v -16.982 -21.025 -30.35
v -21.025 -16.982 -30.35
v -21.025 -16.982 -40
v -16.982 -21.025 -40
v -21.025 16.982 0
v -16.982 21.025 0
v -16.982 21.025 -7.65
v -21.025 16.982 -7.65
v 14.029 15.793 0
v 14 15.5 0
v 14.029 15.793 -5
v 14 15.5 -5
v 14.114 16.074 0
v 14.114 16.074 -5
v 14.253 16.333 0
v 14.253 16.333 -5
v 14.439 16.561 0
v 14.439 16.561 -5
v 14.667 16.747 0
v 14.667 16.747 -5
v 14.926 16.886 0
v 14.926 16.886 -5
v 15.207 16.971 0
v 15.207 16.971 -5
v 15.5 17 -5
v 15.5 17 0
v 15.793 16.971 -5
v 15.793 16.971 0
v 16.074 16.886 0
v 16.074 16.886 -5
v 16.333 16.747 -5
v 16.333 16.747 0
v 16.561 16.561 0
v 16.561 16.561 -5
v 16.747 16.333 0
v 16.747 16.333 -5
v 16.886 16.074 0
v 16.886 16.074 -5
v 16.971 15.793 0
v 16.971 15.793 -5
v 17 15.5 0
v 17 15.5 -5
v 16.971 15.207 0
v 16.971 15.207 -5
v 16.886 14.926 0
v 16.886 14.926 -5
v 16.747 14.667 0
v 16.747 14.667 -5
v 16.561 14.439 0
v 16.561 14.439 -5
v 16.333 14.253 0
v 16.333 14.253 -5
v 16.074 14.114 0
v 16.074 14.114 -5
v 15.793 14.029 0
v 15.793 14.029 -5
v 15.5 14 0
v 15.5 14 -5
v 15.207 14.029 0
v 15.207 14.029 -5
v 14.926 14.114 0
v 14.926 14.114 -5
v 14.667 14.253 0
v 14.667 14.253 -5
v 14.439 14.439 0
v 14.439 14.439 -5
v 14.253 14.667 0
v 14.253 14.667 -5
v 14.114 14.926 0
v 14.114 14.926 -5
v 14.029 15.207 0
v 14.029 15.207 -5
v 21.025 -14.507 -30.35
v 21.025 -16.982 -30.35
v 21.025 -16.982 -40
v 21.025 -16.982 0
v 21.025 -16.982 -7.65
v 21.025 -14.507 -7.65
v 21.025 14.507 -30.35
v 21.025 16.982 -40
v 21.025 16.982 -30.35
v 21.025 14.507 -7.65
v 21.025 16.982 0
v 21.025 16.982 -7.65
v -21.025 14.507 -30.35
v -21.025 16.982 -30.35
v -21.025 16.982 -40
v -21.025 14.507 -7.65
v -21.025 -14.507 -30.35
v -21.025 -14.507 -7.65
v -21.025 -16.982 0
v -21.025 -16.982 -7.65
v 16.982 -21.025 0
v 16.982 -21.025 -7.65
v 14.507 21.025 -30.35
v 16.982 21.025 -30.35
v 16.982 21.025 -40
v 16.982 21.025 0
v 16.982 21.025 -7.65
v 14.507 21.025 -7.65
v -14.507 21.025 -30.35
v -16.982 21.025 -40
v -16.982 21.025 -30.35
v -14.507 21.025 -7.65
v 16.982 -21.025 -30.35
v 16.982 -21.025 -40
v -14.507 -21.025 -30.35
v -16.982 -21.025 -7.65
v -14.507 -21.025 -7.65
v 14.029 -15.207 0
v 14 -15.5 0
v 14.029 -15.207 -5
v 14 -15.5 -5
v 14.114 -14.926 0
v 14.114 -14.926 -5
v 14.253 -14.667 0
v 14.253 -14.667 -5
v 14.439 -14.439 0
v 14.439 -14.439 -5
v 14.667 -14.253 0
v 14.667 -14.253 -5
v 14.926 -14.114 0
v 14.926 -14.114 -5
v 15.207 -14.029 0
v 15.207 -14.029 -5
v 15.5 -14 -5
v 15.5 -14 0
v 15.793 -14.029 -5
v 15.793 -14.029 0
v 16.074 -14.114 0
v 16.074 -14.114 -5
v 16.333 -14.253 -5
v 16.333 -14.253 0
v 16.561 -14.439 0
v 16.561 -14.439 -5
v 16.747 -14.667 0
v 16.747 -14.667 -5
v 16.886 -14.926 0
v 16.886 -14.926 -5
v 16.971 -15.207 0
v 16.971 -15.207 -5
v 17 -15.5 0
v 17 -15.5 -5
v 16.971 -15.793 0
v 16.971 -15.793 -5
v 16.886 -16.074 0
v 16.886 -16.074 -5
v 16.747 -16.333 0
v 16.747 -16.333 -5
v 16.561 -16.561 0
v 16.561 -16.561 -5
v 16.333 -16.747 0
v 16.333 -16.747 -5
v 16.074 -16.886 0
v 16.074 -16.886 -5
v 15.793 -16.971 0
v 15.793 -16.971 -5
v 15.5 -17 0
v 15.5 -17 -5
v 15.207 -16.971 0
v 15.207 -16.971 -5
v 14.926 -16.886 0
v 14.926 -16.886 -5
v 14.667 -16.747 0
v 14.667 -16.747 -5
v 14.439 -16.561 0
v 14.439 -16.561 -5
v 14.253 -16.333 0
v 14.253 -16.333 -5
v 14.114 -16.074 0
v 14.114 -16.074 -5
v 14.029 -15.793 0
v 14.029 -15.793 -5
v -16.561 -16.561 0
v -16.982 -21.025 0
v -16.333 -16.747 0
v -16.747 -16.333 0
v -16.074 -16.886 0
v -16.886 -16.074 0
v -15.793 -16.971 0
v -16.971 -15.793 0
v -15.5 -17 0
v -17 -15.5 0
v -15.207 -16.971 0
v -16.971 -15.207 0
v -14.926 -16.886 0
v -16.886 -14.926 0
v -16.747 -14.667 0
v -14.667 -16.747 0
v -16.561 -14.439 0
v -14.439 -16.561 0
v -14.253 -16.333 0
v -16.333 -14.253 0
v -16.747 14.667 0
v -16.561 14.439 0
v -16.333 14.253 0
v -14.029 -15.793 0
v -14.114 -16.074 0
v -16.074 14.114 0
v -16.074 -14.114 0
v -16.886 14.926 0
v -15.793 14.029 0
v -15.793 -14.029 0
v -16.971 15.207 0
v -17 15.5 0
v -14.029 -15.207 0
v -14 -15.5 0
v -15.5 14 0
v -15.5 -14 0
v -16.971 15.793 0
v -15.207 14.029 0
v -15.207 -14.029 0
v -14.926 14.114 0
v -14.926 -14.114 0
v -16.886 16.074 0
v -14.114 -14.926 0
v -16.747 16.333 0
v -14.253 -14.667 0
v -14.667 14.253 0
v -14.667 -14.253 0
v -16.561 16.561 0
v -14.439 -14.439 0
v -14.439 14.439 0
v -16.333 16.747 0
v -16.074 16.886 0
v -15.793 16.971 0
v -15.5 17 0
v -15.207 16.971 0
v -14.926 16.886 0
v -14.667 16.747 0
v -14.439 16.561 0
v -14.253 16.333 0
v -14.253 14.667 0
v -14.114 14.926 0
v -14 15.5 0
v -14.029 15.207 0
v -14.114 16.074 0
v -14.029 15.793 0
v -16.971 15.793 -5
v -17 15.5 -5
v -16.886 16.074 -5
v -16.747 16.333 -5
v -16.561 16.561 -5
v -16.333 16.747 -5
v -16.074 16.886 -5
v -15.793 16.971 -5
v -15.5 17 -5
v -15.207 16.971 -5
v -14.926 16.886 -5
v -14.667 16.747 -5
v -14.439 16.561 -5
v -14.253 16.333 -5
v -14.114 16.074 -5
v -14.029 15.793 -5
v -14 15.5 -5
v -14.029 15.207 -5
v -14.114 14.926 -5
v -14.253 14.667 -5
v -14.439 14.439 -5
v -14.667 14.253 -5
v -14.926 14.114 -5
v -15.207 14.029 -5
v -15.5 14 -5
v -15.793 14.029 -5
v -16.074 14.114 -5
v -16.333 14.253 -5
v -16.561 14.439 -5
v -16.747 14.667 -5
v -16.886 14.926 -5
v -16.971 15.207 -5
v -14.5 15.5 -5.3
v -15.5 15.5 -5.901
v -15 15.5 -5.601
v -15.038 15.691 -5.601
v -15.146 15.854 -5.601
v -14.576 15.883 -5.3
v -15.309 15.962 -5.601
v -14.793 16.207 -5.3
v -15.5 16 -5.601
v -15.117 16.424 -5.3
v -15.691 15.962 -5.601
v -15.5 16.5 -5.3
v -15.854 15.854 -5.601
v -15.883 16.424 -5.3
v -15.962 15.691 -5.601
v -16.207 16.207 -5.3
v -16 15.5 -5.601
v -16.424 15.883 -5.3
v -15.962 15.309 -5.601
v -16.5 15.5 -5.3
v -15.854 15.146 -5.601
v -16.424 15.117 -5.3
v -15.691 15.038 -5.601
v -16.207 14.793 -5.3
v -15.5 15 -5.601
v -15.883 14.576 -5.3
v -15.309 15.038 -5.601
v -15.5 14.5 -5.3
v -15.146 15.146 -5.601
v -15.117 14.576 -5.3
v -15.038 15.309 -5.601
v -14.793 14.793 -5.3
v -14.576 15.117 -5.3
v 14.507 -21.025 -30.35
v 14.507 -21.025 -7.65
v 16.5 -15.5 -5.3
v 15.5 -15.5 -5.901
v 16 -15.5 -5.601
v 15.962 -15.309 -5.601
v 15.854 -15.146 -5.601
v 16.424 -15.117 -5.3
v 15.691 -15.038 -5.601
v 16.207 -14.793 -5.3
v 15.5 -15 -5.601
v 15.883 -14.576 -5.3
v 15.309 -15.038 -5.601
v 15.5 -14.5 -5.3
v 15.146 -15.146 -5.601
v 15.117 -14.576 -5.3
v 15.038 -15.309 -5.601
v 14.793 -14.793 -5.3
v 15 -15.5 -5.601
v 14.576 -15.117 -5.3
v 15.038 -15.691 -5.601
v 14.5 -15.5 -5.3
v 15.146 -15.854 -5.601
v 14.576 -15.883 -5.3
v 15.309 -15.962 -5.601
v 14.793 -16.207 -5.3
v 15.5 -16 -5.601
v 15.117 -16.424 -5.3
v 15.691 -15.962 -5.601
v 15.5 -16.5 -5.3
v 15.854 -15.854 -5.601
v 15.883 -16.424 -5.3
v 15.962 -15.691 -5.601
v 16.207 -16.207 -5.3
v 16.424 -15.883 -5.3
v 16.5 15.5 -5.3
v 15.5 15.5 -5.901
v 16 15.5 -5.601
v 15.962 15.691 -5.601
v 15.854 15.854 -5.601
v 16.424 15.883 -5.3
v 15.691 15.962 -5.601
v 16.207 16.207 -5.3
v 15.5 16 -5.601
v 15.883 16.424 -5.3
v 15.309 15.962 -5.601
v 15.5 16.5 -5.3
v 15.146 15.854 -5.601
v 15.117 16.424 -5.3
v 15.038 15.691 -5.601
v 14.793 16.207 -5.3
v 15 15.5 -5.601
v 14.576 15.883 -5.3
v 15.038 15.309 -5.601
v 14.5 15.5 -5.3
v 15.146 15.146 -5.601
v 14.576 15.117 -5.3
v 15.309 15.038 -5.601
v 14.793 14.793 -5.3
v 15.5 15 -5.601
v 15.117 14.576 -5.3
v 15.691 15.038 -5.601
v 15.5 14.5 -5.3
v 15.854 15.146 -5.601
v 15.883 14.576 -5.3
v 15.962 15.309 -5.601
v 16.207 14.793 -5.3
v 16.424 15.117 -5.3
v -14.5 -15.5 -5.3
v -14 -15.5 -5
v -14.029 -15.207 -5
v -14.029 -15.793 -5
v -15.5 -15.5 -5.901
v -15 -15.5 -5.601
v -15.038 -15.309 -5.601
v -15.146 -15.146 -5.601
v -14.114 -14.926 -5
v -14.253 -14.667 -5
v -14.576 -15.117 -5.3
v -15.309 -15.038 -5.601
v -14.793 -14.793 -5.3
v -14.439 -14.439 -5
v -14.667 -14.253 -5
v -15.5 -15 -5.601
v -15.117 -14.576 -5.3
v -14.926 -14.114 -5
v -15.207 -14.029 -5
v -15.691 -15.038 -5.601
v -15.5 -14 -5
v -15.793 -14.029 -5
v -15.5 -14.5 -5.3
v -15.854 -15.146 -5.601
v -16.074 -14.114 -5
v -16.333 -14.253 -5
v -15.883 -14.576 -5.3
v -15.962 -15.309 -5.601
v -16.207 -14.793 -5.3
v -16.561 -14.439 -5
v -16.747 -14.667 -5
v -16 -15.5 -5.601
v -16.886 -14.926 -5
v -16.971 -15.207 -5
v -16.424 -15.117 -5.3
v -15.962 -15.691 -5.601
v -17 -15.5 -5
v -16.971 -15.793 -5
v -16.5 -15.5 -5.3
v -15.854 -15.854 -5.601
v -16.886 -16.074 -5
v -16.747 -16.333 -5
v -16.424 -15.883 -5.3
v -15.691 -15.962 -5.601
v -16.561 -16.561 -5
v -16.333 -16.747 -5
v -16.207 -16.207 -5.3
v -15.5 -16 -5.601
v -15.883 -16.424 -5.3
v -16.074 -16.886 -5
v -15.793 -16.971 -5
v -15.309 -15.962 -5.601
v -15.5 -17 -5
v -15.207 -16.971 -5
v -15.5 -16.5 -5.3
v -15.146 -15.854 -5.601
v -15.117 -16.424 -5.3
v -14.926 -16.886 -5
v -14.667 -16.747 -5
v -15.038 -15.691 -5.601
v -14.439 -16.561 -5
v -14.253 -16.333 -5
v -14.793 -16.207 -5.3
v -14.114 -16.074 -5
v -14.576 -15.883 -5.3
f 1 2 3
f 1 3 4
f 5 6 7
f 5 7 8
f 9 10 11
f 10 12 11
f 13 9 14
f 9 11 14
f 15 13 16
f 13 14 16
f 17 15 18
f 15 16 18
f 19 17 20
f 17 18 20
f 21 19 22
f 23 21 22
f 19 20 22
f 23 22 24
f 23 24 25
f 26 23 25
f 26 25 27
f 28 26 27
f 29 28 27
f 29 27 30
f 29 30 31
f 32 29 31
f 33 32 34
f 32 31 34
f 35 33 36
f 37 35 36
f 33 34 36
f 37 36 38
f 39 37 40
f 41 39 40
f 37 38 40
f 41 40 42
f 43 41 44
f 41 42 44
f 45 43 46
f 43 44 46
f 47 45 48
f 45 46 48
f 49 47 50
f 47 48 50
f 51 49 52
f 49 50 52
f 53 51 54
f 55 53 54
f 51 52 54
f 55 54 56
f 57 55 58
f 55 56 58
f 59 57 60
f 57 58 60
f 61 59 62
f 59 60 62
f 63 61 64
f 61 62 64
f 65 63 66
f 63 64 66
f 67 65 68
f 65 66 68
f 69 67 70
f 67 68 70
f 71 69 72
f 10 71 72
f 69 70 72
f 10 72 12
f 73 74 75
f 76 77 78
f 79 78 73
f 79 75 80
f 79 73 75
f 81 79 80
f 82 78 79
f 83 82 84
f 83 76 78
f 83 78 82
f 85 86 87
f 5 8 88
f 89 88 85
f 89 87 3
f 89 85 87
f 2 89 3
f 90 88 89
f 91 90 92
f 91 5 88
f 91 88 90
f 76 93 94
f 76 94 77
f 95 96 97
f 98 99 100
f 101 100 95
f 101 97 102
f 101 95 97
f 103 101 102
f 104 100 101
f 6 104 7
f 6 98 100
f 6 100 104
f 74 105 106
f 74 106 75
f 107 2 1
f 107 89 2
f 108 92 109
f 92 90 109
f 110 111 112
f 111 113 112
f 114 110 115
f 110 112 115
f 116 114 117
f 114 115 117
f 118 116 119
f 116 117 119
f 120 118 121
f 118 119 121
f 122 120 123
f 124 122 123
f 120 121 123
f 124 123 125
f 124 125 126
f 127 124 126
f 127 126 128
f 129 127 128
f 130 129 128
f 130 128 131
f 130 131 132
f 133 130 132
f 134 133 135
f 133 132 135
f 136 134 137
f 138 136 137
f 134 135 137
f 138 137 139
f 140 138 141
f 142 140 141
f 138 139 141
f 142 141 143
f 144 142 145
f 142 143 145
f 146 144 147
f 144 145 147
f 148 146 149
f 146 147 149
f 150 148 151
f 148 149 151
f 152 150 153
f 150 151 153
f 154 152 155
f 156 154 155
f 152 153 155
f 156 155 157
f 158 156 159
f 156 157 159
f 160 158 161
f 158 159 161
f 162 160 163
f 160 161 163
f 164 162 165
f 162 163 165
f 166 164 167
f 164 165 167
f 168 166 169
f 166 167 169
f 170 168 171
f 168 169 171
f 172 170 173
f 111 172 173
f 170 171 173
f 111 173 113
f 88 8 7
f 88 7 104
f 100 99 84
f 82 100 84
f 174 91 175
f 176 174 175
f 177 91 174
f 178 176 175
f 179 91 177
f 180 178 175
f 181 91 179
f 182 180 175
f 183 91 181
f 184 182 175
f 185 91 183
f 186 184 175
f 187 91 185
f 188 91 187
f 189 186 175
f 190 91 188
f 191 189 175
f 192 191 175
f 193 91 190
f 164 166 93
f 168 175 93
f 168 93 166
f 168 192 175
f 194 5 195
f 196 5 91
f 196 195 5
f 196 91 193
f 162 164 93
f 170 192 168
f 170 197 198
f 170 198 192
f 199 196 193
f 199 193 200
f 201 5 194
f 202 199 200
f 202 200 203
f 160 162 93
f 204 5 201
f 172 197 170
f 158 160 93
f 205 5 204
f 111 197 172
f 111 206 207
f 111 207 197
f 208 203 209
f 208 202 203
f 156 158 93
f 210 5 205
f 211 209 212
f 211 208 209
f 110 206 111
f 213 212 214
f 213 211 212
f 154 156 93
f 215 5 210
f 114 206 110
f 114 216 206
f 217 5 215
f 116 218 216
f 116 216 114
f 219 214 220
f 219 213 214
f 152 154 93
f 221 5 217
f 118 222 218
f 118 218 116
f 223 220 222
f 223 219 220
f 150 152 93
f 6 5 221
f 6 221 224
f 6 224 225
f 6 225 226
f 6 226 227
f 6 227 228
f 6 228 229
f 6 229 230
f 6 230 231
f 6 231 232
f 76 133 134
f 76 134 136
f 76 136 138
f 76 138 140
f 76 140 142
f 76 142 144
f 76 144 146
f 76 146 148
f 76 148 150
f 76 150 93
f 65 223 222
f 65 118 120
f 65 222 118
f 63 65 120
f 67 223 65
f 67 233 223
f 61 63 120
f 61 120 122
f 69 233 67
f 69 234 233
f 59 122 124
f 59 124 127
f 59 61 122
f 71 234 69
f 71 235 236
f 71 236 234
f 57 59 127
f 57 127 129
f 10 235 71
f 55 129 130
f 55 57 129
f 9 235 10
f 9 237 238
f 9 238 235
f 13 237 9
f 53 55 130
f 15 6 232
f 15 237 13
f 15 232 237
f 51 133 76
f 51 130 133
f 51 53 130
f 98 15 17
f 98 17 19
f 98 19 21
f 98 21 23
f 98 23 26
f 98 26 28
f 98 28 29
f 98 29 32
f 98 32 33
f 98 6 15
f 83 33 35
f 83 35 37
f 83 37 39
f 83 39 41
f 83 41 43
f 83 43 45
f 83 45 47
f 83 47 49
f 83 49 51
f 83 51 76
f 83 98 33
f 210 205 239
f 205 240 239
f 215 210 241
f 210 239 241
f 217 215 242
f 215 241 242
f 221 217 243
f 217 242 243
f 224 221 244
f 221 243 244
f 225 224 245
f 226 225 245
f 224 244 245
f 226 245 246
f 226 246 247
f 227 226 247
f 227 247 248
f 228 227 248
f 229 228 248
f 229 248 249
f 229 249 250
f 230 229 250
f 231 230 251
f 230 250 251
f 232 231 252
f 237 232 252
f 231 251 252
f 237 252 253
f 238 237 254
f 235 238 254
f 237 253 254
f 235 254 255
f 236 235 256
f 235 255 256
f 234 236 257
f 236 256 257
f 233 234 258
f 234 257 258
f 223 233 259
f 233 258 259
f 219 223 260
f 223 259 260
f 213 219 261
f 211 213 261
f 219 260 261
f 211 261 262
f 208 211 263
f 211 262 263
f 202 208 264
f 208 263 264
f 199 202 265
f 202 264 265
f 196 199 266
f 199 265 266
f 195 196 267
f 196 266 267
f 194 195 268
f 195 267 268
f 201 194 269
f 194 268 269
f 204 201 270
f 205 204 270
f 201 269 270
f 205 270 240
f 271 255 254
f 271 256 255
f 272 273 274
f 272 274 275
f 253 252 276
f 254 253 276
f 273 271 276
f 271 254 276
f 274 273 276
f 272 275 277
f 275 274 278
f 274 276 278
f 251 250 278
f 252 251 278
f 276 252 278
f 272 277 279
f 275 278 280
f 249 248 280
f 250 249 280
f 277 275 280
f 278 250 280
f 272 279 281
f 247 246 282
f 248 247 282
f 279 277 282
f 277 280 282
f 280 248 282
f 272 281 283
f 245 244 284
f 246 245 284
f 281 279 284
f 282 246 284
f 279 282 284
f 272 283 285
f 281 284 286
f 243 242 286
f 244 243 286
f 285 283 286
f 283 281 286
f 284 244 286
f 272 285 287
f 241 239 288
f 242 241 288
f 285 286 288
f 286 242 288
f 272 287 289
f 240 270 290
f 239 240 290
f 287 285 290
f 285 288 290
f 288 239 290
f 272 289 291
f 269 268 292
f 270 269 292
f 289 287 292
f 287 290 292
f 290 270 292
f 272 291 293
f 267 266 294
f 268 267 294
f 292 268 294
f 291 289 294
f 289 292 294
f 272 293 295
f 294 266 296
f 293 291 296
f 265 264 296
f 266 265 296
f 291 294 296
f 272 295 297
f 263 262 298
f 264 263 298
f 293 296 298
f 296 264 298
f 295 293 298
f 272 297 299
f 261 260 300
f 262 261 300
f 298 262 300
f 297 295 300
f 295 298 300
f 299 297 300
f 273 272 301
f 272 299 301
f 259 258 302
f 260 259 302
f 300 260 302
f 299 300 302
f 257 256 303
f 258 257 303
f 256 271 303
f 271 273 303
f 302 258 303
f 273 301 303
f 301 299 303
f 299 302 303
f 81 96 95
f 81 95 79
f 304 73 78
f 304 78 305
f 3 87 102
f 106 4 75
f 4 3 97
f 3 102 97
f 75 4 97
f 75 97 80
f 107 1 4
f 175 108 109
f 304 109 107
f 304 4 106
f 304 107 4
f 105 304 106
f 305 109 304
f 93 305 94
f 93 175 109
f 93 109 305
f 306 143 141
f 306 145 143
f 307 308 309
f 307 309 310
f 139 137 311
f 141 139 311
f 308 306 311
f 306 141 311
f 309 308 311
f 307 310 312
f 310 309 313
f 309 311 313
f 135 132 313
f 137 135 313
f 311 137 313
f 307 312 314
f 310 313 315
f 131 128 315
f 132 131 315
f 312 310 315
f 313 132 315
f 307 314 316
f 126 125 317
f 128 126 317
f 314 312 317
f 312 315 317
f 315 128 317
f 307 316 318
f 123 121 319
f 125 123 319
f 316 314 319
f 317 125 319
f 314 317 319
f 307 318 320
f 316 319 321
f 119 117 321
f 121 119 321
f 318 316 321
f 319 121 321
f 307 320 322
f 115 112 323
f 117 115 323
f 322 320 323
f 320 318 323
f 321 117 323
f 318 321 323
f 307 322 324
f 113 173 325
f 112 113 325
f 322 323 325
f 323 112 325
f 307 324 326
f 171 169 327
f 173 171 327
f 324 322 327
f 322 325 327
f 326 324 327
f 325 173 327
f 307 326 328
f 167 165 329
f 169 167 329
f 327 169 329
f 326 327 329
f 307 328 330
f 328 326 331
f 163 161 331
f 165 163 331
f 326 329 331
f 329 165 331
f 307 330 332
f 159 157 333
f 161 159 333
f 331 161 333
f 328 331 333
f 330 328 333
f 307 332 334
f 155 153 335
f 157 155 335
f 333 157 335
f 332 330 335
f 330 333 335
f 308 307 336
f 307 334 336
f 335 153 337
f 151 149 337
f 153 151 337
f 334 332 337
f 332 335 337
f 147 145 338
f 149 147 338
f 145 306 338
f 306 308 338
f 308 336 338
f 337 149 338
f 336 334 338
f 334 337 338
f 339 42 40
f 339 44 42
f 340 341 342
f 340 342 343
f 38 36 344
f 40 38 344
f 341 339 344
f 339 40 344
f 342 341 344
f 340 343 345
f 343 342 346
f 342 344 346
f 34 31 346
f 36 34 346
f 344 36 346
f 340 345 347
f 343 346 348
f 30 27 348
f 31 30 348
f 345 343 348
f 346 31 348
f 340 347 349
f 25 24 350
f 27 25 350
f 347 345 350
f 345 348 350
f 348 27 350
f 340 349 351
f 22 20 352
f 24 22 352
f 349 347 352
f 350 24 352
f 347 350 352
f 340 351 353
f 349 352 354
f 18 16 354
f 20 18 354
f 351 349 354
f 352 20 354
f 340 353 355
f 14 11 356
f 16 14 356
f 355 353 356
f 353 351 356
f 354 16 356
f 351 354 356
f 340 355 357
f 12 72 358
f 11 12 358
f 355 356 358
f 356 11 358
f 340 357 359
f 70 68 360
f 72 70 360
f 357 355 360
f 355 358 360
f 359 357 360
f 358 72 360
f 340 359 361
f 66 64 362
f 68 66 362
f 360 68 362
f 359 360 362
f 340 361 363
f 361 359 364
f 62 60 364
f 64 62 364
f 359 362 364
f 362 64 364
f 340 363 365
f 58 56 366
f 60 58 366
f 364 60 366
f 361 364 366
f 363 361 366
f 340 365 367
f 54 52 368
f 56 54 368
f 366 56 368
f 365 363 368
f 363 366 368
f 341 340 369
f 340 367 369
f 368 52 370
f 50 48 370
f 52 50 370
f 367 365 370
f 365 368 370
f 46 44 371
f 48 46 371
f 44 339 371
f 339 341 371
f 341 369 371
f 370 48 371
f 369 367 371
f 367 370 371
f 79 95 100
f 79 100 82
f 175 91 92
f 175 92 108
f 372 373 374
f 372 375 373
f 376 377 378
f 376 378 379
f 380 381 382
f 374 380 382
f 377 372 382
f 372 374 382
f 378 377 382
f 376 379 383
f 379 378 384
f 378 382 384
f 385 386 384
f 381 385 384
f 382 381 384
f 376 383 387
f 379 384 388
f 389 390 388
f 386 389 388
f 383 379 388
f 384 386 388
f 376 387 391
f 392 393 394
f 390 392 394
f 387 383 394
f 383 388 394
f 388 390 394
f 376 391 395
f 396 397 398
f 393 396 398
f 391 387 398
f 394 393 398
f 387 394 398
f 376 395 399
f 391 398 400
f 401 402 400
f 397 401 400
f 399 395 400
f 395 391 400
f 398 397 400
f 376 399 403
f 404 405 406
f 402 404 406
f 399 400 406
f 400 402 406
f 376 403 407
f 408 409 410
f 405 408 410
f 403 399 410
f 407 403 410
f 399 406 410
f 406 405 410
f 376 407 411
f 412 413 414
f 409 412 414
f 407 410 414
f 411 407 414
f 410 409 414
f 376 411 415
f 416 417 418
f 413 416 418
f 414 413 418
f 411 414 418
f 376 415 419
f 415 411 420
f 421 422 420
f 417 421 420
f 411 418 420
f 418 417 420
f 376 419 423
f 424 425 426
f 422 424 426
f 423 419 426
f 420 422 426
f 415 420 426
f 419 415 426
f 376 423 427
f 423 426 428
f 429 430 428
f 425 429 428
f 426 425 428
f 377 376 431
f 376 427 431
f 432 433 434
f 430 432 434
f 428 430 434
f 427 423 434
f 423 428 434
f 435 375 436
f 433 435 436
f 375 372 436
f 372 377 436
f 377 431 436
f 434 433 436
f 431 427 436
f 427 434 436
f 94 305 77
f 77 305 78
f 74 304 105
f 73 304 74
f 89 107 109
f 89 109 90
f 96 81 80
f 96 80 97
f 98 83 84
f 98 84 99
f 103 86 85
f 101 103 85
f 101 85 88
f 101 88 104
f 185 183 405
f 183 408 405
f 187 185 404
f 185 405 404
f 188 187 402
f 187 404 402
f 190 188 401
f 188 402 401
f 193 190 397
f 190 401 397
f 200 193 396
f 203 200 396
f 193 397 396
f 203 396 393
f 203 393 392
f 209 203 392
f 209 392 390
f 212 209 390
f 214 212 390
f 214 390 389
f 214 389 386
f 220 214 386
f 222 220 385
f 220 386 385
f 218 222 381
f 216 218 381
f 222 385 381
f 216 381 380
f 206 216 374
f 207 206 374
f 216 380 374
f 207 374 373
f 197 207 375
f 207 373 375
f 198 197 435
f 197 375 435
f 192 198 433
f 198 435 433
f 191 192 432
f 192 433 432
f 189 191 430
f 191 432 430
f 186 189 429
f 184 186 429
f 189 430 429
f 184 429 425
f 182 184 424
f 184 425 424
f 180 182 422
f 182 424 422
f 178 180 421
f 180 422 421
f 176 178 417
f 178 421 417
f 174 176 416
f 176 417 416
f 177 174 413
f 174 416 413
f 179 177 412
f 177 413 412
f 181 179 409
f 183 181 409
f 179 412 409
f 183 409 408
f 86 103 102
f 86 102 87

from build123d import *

# Parameters (mm, degrees)
F1_DEPTH = 40
F4_DEPTH = 22.7
F6_D     = 3
F6_DEPTH = 5
F6_TIP   = 0.9012909285


with BuildPart() as f1:
    # F0 (on Top) → F1 (new body)
    with BuildSketch(Plane.XY):
        Polygon((16.9819894888, 21.025), (-16.9819894888, 21.025), (-21.025, 16.9819894888), (-21.025, -16.9819894888), (-16.9819894888, -21.025), (16.9819894888, -21.025), (21.025, -16.9819894888), (21.025, 16.9819894888), align=None)
    extrude(amount=-F1_DEPTH)

    # F3 (on offset) + F1_face (on face) → F4 (cut)
    with BuildSketch(Plane.XY.offset(-7.65)):
        Polygon((-21.025, 16.9819894888), (-21.025, 14.5071157546), (-14.5071157546, 21.025), (-16.9819894888, 21.025), align=None)
        Polygon((16.9819894888, 21.025), (14.5071157546, 21.025), (21.025, 14.5071157546), (21.025, 16.9819894888), align=None)
        Polygon((21.025, -14.5071157546), (14.5071157546, -21.025), (16.9819894888, -21.025), (21.025, -16.9819894888), align=None)
        Polygon((-21.025, -16.9819894888), (-16.9819894888, -21.025), (-14.5071157546, -21.025), (-21.025, -14.5071157546), align=None)
    with BuildSketch(Plane(origin=(0, 0, -40), x_dir=(1, 0, 0), z_dir=(0, 0, -1))):
        Polygon((21.025, -16.9819894888), (21.025, 16.9819894888), (16.9819894888, 21.025), (-16.9819894888, 21.025), (-21.025, 16.9819894888), (-21.025, -16.9819894888), (-16.9819894888, -21.025), (16.9819894888, -21.025), align=None)
    extrude(amount=-F4_DEPTH, dir=(0, 0, 1), mode=Mode.SUBTRACT)

    # F6
    with Locations(Plane.XY):
        with Locations((-15.5, 15.5), (15.5, 15.5), (15.5, -15.5), (-15.5, -15.5)):
            Hole(F6_D / 2, depth=F6_DEPTH)
            with Locations((0, 0, -(F6_DEPTH + F6_TIP / 2))):  # 118° drill point
                Cone(0, F6_D / 2, F6_TIP, mode=Mode.SUBTRACT)


solid = f1.part
